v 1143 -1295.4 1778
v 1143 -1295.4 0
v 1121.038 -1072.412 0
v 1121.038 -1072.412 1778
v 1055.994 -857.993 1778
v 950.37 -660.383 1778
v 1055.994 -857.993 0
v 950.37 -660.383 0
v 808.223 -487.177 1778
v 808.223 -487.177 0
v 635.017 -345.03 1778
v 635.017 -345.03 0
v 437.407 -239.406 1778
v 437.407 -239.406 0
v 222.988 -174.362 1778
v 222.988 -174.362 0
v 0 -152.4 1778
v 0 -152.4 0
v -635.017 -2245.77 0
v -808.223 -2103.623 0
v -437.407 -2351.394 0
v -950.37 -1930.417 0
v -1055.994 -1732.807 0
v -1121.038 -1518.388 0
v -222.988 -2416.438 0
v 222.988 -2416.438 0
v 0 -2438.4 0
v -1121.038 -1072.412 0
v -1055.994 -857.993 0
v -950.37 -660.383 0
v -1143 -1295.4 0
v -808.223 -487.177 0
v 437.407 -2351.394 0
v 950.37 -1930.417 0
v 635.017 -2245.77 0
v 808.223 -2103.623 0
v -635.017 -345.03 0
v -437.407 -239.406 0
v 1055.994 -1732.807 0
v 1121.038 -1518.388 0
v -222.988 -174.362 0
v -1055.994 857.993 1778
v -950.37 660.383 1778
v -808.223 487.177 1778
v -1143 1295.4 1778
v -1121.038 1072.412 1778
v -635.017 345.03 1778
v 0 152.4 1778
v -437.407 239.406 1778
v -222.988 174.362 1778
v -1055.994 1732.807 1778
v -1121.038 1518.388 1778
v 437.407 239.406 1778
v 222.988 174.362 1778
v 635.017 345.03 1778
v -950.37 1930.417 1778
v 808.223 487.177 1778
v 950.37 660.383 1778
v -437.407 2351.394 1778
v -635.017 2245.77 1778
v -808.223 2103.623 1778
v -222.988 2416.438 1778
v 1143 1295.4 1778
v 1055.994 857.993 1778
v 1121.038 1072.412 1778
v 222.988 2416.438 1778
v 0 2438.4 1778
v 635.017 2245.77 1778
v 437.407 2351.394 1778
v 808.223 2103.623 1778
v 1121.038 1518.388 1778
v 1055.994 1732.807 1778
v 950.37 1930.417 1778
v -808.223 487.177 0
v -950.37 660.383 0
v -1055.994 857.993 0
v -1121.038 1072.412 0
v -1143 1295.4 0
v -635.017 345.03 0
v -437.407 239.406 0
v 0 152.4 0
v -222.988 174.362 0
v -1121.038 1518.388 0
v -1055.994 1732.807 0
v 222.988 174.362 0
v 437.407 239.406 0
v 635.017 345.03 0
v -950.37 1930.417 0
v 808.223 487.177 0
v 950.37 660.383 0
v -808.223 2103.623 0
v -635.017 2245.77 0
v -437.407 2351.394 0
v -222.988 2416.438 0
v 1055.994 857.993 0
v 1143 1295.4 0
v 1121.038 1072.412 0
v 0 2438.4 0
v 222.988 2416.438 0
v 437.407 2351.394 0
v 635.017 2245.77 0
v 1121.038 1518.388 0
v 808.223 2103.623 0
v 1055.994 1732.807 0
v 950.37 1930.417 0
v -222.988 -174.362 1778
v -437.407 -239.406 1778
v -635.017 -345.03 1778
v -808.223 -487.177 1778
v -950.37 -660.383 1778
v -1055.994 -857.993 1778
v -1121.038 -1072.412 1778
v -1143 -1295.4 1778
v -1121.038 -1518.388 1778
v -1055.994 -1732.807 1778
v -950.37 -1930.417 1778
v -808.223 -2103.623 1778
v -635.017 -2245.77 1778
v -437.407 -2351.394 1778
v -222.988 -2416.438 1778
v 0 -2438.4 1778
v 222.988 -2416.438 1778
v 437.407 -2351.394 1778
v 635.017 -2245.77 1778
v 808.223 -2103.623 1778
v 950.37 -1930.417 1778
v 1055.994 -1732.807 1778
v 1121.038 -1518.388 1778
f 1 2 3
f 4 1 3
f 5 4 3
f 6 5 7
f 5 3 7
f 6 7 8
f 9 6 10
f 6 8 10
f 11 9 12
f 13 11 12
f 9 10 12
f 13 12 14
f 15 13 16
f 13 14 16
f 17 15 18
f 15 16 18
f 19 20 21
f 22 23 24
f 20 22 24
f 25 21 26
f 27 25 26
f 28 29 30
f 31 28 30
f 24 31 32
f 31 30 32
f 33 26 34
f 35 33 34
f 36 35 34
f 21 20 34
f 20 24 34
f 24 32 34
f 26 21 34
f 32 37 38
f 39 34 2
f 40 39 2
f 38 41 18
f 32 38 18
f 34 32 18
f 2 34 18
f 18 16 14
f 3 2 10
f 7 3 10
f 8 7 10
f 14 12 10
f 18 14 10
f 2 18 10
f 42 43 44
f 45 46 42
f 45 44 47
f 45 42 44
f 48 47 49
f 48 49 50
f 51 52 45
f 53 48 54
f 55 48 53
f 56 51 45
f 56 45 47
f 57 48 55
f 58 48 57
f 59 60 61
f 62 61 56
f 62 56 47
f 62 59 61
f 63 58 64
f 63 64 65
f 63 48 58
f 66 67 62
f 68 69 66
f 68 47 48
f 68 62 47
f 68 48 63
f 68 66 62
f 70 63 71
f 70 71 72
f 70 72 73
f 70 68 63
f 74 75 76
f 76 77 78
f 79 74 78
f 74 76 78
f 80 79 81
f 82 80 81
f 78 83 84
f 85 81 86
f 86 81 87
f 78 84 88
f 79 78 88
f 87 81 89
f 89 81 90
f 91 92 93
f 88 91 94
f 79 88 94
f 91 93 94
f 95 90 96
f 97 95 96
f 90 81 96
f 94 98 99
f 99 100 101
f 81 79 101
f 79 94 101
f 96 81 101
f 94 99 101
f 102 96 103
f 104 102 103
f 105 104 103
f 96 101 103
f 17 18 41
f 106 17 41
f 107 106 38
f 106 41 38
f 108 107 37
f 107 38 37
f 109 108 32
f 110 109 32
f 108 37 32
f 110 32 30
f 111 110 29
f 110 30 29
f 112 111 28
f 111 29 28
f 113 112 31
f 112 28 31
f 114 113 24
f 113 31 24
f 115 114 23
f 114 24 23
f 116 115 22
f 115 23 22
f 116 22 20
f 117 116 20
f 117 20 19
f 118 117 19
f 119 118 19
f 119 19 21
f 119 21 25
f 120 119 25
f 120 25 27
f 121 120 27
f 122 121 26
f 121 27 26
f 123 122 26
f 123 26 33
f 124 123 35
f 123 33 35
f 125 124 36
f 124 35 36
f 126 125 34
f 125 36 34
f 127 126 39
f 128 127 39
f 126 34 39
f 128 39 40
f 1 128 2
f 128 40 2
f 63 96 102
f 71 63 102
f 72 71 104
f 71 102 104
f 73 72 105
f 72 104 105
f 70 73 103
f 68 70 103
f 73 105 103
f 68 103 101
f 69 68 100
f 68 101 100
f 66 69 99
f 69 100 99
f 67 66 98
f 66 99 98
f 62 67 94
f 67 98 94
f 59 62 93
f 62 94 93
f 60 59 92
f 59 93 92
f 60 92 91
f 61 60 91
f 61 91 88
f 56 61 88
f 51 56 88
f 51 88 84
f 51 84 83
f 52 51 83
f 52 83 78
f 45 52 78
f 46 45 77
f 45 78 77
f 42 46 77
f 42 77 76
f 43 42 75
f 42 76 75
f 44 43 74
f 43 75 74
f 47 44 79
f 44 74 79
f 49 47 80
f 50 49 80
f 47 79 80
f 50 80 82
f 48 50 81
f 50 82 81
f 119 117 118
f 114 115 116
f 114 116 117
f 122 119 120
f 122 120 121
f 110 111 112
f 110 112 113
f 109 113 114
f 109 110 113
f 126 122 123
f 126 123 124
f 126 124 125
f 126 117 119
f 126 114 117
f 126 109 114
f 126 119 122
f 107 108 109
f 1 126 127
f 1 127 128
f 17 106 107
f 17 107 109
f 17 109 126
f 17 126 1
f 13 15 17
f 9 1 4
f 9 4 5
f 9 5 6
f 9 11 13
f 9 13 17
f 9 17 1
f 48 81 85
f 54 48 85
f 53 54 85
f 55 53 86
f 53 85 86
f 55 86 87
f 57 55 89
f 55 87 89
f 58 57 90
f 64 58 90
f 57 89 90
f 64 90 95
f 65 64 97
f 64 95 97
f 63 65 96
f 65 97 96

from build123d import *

# Parameters (mm, degrees)
F1_DEPTH = 1778


with BuildPart() as f1:
    # F0 (on Top) → F1 (new body)
    with BuildSketch(Plane.XY):
        with BuildLine():
            ThreePointArc((1143, 1295.4), (-808.223051, 2103.623051), (0, 152.4))
            ThreePointArc((0, 152.4), (808.223051, 487.176949), (1143, 1295.4))
        make_face()
        with BuildLine():
            ThreePointArc((1143, -1295.4), (808.223051, -487.176949), (0, -152.4))
            ThreePointArc((0, -152.4), (-808.223051, -2103.623051), (1143, -1295.4))
        make_face()
    extrude(amount=F1_DEPTH)


solid = f1.part
